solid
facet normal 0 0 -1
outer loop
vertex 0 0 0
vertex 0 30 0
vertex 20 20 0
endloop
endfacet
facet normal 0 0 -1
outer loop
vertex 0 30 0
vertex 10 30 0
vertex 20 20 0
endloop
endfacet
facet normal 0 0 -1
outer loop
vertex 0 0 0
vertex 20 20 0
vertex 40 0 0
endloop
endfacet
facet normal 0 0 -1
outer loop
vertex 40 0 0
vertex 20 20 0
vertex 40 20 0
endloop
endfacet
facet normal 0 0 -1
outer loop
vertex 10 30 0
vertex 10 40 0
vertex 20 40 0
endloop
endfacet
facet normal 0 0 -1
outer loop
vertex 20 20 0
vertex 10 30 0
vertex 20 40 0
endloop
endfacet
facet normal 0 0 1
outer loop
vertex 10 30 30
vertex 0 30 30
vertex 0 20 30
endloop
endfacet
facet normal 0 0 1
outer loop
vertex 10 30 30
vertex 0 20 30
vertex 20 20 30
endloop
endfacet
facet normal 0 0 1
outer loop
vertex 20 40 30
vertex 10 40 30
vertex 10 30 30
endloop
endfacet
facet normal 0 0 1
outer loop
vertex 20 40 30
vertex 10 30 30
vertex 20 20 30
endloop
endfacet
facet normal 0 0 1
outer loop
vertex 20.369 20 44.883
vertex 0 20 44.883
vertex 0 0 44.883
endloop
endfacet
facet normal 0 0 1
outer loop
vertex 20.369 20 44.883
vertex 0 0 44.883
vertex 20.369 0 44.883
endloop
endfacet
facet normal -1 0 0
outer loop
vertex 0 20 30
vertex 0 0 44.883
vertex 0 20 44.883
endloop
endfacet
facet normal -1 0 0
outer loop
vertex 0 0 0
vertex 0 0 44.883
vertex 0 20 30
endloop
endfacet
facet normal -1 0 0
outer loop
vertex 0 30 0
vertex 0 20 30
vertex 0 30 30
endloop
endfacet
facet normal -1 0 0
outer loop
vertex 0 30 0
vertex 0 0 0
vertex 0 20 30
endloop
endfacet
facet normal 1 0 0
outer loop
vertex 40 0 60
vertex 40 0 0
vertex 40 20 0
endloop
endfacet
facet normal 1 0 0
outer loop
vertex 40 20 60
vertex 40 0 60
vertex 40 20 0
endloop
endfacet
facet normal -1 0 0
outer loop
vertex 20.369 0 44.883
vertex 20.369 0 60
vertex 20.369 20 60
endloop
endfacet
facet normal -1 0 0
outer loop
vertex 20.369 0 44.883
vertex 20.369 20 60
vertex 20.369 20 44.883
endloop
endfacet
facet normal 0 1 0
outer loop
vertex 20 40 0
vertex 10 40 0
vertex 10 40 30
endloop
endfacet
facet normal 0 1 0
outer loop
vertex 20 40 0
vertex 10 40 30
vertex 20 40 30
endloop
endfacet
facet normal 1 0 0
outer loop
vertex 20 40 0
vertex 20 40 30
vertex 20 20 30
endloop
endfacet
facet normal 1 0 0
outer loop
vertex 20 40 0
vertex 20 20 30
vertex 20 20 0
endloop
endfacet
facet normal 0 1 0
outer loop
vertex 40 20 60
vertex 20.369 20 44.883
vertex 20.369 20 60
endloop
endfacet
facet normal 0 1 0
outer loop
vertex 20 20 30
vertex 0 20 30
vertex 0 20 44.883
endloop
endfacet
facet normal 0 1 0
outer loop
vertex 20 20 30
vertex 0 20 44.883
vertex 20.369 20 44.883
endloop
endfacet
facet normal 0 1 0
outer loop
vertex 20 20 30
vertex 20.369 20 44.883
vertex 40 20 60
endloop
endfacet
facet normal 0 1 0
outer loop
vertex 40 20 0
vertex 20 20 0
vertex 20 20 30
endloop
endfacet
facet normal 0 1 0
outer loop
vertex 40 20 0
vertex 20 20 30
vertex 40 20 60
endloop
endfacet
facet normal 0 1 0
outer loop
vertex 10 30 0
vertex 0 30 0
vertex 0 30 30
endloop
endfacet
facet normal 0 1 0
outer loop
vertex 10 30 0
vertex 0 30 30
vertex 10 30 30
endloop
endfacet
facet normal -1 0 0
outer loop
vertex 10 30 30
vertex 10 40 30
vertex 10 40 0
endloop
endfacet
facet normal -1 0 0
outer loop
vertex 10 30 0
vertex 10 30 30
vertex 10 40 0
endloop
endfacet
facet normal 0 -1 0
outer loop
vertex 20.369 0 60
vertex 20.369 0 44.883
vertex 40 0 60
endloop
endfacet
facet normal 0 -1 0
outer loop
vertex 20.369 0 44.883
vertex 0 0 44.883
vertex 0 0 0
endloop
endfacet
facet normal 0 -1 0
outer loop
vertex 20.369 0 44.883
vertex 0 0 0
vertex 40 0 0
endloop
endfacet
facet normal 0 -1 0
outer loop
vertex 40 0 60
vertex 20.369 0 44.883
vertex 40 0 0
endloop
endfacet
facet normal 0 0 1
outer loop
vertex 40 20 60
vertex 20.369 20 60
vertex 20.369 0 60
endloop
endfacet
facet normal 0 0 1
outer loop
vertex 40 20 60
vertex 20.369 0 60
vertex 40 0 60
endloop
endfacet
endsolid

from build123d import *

# Parameters (mm, degrees)
SKETCH1_W           = 40
SKETCH1_H           = 40
BOSS_EXTRUDE1_DEPTH = 60
SKETCH2_W           = 20
SKETCH2_H           = 60
CUT_EXTRUDE1_DEPTH  = 20
SKETCH3_W           = 10
SKETCH3_H           = 30
CUT_EXTRUDE2_DEPTH  = 10
SKETCH4_W           = 20
SKETCH4_H           = 30
CUT_EXTRUDE3_DEPTH  = 20
SKETCH5_W           = 20.369010991
SKETCH5_H           = 15.116556711
CUT_EXTRUDE4_DEPTH  = 20


with BuildPart() as part:
    # Sketch1 → Boss-Extrude1 (new body)
    with BuildSketch(Plane.XY):
        with Locations((20, 20)):
            Rectangle(SKETCH1_W, SKETCH1_H)
    extrude(amount=BOSS_EXTRUDE1_DEPTH)

    # Sketch2 → Cut-Extrude1 (cut)
    with BuildSketch(Plane(origin=(0, 40, 0), x_dir=(1, 0, 0), z_dir=(0, 1, 0))):
        with Locations((30, -30)):
            Rectangle(SKETCH2_W, SKETCH2_H)
    extrude(amount=-CUT_EXTRUDE1_DEPTH, mode=Mode.SUBTRACT)

    # Sketch3 → Cut-Extrude2 (cut)
    with BuildSketch(Plane(origin=(0, 40, 0), x_dir=(1, 0, 0), z_dir=(0, 1, 0))):
        with Locations((5, -15)):
            Rectangle(SKETCH3_W, SKETCH3_H)
    extrude(amount=-CUT_EXTRUDE2_DEPTH, mode=Mode.SUBTRACT)

    # Sketch4 → Cut-Extrude3 (cut)
    with BuildSketch(Plane(origin=(0, 40, 0), x_dir=(1, 0, 0), z_dir=(0, 1, 0))):
        with Locations((10, -45)):
            Rectangle(SKETCH4_W, SKETCH4_H)
    extrude(amount=-CUT_EXTRUDE3_DEPTH, mode=Mode.SUBTRACT)

    # Sketch5 → Cut-Extrude4 (cut)
    with BuildSketch(Plane(origin=(0, 20, 0), x_dir=(1, 0, 0), z_dir=(0, 1, 0))):
        with Locations((10.184505495, -52.441721645)):
            Rectangle(SKETCH5_W, SKETCH5_H)
    extrude(amount=-CUT_EXTRUDE4_DEPTH, mode=Mode.SUBTRACT)


solid = part.part
